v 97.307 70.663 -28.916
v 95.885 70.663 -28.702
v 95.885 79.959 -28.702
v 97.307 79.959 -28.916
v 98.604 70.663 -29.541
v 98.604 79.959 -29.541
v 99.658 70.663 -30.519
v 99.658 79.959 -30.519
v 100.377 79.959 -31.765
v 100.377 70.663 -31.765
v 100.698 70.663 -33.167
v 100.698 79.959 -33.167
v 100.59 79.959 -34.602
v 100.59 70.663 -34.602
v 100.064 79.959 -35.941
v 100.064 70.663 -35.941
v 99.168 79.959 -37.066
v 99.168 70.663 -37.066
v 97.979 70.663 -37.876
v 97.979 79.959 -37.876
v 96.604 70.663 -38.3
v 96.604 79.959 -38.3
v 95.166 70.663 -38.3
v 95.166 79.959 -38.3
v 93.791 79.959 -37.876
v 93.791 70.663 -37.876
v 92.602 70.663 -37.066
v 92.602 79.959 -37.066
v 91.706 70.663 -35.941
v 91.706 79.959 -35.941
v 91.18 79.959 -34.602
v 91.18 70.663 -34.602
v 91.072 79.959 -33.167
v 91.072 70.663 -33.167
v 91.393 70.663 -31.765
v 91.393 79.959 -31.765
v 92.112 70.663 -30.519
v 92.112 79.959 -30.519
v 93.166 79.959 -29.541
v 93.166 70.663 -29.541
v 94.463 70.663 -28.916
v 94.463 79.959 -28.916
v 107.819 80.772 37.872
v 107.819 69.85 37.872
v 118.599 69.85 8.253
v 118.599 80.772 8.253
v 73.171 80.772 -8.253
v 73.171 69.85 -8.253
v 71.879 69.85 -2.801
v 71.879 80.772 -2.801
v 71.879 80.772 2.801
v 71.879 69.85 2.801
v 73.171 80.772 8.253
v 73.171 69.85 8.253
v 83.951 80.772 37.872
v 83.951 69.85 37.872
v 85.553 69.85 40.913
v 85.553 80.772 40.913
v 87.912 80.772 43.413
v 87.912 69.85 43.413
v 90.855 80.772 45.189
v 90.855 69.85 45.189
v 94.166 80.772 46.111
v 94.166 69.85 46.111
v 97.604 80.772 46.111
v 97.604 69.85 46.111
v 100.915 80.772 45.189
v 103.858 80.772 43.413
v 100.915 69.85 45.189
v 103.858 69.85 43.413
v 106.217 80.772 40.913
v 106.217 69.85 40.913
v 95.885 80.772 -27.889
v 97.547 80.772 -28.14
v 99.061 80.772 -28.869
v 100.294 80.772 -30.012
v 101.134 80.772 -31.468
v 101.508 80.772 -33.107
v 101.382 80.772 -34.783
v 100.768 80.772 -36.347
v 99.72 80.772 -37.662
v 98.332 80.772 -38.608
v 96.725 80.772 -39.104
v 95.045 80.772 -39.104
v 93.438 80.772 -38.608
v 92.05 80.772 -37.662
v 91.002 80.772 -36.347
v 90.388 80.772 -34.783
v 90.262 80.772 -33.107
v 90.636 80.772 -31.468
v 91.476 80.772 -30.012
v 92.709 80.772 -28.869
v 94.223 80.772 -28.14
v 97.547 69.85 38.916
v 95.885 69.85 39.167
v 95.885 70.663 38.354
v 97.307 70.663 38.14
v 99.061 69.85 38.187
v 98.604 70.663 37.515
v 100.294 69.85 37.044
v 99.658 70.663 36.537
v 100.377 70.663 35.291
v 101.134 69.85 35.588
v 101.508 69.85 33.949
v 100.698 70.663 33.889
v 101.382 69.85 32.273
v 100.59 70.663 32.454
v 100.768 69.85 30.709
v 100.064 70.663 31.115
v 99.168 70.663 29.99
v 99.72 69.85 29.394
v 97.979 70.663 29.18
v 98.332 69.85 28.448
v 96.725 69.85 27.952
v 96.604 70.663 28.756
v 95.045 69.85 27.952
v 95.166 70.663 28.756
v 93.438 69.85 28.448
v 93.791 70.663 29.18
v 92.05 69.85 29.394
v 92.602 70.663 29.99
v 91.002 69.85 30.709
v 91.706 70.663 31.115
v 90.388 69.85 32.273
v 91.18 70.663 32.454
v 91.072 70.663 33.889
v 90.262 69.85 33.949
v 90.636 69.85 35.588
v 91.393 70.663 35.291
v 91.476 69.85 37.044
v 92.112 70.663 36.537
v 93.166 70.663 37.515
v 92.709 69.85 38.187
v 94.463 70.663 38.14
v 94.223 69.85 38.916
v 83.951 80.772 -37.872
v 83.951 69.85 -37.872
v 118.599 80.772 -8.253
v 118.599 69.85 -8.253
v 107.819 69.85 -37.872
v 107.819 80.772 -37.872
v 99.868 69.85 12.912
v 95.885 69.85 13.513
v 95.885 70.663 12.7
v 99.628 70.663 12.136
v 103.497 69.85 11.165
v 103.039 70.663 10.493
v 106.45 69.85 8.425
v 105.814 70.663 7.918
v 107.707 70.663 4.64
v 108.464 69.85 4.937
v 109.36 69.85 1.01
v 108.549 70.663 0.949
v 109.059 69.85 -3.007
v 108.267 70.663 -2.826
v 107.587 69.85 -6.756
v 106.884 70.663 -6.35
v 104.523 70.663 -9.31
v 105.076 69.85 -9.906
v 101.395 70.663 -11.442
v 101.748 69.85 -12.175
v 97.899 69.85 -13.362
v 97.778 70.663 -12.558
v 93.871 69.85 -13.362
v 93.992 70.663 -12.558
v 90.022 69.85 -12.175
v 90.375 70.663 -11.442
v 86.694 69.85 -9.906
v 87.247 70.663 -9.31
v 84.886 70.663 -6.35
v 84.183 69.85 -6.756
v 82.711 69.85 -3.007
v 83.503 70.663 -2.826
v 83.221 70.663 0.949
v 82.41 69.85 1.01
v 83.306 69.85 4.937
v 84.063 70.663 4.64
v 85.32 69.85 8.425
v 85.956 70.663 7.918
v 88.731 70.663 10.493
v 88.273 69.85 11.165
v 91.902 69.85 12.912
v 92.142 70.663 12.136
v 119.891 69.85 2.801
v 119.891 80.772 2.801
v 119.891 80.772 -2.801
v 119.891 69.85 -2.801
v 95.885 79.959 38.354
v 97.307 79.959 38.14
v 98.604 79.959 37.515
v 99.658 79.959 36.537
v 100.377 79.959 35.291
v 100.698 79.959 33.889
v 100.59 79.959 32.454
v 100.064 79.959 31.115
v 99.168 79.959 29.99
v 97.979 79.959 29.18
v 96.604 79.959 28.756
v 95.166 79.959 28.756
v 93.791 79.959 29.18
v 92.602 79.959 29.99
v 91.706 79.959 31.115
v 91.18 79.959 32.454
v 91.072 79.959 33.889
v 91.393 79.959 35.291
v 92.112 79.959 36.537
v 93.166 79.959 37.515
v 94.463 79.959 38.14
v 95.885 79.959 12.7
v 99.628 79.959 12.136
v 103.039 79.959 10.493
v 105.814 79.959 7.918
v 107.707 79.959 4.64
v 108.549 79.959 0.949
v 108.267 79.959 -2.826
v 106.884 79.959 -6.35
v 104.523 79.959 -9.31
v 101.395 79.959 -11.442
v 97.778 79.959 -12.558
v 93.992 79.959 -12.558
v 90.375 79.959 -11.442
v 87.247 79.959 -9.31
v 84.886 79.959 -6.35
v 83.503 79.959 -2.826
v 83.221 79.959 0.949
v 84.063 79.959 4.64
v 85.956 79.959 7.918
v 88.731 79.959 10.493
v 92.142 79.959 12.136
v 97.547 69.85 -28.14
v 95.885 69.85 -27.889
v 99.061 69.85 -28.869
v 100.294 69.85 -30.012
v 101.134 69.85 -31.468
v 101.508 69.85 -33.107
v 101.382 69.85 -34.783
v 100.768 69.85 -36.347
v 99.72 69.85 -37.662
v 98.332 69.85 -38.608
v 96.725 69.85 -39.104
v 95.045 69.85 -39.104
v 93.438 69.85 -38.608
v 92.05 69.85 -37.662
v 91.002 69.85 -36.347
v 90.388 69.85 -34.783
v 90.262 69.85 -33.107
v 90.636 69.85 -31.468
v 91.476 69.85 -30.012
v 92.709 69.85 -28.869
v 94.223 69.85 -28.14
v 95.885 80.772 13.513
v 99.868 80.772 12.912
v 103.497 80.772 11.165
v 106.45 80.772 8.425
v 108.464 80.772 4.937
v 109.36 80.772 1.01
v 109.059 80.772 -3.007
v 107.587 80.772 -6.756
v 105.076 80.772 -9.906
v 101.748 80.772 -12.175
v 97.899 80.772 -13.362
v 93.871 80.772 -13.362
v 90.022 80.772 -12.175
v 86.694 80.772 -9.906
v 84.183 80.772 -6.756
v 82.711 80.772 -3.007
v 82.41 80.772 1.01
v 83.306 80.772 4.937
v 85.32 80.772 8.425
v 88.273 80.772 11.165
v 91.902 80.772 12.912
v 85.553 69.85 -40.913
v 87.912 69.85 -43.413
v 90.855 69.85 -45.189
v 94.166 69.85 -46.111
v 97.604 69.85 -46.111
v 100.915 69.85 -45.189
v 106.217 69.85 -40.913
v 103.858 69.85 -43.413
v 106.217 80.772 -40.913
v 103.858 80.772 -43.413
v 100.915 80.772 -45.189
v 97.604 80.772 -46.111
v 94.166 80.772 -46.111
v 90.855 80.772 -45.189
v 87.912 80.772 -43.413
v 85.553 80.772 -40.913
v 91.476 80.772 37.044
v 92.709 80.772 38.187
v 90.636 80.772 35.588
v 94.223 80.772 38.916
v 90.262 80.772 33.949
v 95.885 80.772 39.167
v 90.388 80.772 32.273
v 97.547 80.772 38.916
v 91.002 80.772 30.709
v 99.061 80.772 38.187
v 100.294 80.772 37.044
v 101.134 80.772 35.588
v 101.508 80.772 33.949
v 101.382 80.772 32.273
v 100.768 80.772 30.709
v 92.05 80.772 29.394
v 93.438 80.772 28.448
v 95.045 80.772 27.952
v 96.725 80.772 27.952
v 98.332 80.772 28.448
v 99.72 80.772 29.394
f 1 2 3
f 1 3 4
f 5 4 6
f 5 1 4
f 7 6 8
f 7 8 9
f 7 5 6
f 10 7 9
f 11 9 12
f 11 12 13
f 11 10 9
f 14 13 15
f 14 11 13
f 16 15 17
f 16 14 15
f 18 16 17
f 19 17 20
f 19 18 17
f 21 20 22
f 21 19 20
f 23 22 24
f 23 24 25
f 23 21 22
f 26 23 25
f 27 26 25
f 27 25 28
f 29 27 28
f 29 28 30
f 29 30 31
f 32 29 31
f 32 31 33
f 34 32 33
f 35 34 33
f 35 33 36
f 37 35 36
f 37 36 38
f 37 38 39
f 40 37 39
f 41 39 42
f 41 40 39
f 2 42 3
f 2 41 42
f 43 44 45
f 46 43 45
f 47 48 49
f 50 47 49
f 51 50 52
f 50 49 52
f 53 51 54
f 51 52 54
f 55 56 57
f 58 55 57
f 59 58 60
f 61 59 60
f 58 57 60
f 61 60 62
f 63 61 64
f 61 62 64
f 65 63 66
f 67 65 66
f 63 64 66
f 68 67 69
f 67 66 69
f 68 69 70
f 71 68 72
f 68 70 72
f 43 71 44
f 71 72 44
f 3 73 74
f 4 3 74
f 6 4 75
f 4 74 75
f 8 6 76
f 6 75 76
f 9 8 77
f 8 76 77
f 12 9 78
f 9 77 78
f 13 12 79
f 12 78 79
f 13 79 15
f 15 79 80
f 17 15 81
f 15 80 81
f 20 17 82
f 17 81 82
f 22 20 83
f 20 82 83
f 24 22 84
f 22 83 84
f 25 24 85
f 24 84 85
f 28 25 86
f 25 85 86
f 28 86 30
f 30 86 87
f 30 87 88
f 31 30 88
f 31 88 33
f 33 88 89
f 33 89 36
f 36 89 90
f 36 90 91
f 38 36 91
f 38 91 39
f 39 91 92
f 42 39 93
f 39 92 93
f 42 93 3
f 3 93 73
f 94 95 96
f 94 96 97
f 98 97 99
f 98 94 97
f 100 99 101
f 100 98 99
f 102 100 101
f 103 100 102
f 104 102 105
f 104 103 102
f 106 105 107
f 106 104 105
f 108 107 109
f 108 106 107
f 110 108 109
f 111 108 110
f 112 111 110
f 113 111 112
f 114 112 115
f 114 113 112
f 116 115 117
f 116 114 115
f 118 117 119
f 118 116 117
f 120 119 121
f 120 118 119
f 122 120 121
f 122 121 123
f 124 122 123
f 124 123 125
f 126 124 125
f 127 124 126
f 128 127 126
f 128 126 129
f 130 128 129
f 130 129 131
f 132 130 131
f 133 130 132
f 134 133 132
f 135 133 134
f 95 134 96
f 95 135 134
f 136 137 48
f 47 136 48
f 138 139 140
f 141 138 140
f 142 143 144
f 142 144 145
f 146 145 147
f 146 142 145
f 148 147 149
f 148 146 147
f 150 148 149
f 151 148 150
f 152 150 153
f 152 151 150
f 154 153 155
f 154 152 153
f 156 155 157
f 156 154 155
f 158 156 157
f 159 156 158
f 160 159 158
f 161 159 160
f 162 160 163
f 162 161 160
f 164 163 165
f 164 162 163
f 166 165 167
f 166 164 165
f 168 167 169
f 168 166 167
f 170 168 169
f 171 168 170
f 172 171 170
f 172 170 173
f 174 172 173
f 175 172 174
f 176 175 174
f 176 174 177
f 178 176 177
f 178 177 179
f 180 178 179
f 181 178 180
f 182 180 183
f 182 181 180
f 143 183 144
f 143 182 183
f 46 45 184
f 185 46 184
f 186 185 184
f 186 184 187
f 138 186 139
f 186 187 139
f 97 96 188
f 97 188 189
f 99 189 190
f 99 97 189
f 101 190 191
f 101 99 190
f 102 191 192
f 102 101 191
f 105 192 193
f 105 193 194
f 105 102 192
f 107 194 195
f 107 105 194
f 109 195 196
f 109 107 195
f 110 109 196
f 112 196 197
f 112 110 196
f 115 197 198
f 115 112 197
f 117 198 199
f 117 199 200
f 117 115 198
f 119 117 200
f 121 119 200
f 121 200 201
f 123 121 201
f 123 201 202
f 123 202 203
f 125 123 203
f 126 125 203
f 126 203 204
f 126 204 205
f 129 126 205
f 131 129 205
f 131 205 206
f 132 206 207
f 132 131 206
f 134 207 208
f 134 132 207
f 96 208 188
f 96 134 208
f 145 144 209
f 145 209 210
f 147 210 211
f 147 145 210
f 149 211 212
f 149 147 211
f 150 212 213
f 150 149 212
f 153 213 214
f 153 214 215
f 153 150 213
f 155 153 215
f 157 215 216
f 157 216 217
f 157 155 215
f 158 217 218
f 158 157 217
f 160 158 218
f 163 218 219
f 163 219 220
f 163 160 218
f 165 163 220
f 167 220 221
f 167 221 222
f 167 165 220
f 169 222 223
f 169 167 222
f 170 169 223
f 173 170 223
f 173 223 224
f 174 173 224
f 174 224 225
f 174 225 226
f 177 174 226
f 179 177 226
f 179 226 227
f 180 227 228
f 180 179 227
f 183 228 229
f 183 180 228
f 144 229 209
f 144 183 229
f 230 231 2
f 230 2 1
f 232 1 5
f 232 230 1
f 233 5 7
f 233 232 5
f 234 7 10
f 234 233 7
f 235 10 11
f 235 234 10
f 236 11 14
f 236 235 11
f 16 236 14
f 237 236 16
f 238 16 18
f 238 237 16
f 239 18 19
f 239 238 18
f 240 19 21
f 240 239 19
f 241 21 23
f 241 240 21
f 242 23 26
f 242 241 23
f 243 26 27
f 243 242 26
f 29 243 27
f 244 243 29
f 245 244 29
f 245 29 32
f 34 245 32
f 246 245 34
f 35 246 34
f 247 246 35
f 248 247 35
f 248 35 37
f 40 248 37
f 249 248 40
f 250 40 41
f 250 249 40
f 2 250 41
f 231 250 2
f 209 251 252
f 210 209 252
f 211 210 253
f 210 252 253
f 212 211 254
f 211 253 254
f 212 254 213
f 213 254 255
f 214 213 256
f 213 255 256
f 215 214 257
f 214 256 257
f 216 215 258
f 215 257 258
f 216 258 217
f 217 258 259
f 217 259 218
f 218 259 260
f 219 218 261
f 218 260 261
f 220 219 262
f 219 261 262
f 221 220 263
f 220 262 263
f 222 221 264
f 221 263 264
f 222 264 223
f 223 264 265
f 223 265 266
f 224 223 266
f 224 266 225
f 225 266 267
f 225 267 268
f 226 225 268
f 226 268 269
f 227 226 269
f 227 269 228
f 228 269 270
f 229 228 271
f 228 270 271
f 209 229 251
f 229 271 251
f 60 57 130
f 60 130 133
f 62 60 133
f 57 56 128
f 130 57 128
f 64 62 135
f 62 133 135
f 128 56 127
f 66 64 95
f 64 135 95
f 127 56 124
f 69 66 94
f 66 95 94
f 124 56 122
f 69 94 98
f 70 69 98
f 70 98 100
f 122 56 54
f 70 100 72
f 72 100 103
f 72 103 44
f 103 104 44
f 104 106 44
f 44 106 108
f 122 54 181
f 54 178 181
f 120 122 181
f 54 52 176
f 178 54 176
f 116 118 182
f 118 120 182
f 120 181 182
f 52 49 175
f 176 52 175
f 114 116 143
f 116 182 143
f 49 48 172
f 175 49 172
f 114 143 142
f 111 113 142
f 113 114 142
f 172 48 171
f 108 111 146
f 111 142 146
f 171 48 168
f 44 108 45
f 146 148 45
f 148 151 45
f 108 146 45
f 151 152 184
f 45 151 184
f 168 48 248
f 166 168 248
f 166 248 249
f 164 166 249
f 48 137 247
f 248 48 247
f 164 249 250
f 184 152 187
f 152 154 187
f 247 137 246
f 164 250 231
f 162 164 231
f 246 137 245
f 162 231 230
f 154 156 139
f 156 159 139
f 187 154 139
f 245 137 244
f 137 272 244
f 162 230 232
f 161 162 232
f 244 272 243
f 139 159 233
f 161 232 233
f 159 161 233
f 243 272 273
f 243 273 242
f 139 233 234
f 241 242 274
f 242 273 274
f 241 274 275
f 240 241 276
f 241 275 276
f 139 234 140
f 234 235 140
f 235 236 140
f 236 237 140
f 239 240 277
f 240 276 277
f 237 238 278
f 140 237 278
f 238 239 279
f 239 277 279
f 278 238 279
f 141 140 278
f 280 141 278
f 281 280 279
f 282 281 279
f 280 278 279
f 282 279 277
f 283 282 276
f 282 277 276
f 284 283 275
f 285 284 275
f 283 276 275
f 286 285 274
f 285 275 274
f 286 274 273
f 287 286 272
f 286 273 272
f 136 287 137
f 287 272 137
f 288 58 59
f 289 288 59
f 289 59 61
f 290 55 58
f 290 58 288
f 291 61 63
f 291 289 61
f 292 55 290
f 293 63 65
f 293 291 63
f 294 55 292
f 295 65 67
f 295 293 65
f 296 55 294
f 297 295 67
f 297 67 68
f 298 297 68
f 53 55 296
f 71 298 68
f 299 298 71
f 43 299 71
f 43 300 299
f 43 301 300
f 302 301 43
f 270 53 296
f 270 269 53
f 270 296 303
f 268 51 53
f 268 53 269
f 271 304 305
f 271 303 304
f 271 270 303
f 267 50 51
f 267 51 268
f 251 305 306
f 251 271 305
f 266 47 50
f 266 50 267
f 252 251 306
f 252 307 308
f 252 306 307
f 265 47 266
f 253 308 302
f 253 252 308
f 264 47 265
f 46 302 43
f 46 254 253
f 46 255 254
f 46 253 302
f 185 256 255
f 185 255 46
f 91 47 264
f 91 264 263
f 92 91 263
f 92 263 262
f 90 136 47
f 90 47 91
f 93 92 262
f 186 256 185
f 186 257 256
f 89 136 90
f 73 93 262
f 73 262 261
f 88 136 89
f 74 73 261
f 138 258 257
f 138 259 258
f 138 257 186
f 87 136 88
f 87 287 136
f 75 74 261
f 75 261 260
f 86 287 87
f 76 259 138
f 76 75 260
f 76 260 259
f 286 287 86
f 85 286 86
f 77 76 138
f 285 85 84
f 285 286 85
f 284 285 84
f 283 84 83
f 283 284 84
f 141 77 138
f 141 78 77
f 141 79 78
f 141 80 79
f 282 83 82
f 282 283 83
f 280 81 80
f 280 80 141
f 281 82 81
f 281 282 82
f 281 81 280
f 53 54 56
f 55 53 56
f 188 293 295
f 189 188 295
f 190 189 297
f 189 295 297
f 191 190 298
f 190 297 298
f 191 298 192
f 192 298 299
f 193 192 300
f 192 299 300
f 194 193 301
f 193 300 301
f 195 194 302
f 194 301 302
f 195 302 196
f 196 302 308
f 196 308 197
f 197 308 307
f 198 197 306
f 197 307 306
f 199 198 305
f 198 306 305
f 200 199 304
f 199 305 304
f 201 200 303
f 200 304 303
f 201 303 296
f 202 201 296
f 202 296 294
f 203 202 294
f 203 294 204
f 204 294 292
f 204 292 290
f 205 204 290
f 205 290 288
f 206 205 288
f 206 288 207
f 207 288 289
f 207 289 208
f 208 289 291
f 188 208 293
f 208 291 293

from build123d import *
from build123d.topology import SkipClean

# Parameters (mm, degrees)
BOSS_EXTRUDE1_START     = 16.51
SKETCH2_R               = 6.6675
SKETCH2_R_2             = 47.625
SKETCH2_R_3             = 25.4
BOSS_EXTRUDE1_DEPTH     = 16.51
CUT_EXTRUDE1_REACH      = 129.898
SKETCH3_R               = 9.525
CHAMFER1_SIZE           = 0.8128
CHAMFER2_SIZE           = 0.8128
CHAMFER3_SIZE           = 3.175
FILLET2_R               = 1.524
SKETCH4_R               = 7.4803
SKETCH4_R_2             = 25.4
BOSS_EXTRUDE2_DEPTH     = 16.51
SKETCH6_R               = 76.2
SKETCH6_R_2             = 9.525
SKETCH6_R_3             = 25.4
BOSS_EXTRUDE3_DEPTH     = 16.51
SKETCH8_R               = 12.7
SKETCH8_R_2             = 4.826
BOSS_EXTRUDE4_DEPTH     = 9.8552
BOSS_EXTRUDE5_REACH     = 241.142
SKETCH9_R               = 19.05
CUT_EXTRUDE2_REACH      = 241.142
CUT_EXTRUDE2_END_RADIUS = 25.4
SKETCH8_4_R             = 12.7
CHAMFER4_SIZE           = 0.8128
CHAMFER5_SIZE           = 3.175
FILLET3_R               = 2.032
SKETCH10_R              = 4.826
SKETCH10_R_2            = 12.7
BOSS_EXTRUDE6_DEPTH     = 10.922
CHAMFER6_SIZE           = 0.8128


with BuildPart() as part:
    # Sketch1 → Revolve1 (revolve)
    with BuildSketch(Plane.XY, mode=Mode.PRIVATE) as revolve1_sk:
        Polygon((0, 25.4), (53.975, 25.4), (53.975, 47.625), (52.3748, 46.0248), (52.3748, 34.29), (34.925, 34.29), (16.51, 38.204229083), (16.51, 76.2), (1.6002, 76.2), (1.6002, 47.6377), (0, 46.0375), align=None)
    revolve(revolve1_sk.sketch.rotate(Axis((0, 0, 0), (1, 0, 0)), 90), axis=Axis((0, 0, 0), (1, 0, 0)))

    # Sketch2 → Boss-Extrude1 (add)
    # profile 1 of 2: a face of its own
    with BuildSketch(Plane(origin=(53.975, 0, 0), x_dir=(0, 0, -1), z_dir=(1, 0, 0)).offset(BOSS_EXTRUDE1_START)):
        with BuildLine():
            Line((-59.9948, 40.005), (-59.9948, 24.717162721))
            ThreePointArc((-59.9948, 24.717162721), (-60.246417717, 21.150810443), (-60.996285714, 17.655116229))
            ThreePointArc((-60.996285714, 17.655116229), (-63.5, 0), (-60.996285714, -17.655116229))
            ThreePointArc((-60.996285714, -17.655116229), (-60.246417717, -21.150810443), (-59.9948, -24.717162721))
            Line((-59.9948, -24.717162721), (-59.9948, -40.005))
            ThreePointArc((-59.9948, -40.005), (-54.139923135, -54.139923135), (-40.005, -59.9948))
            Line((-40.005, -59.9948), (-24.717162721, -59.9948))
            ThreePointArc((-24.717162721, -59.9948), (-21.150810443, -60.246417717), (-17.655116229, -60.996285714))
            ThreePointArc((-17.655116229, -60.996285714), (0, -63.5), (17.655116229, -60.996285714))
            ThreePointArc((17.655116229, -60.996285714), (21.150810443, -60.246417717), (24.717162721, -59.9948))
            Line((24.717162721, -59.9948), (40.005, -59.9948))
            ThreePointArc((40.005, -59.9948), (54.139923135, -54.139923135), (59.9948, -40.005))
            Line((59.9948, -40.005), (59.9948, -24.717162721))
            ThreePointArc((59.9948, -24.717162721), (60.246417717, -21.150810443), (60.996285714, -17.655116229))
            ThreePointArc((60.996285714, -17.655116229), (63.5, 0), (60.996285714, 17.655116229))
            ThreePointArc((60.996285714, 17.655116229), (60.246417717, 21.150810443), (59.9948, 24.717162721))
            Line((59.9948, 24.717162721), (59.9948, 40.005))
            ThreePointArc((59.9948, 40.005), (54.139923135, 54.139923135), (40.005, 59.9948))
            Line((40.005, 59.9948), (24.717162721, 59.9948))
            ThreePointArc((24.717162721, 59.9948), (21.150810443, 60.246417717), (17.655116229, 60.996285714))
            ThreePointArc((17.655116229, 60.996285714), (0, 63.5), (-17.655116229, 60.996285714))
            ThreePointArc((-17.655116229, 60.996285714), (-21.150810443, 60.246417717), (-24.717162721, 59.9948))
            Line((-24.717162721, 59.9948), (-40.005, 59.9948))
            ThreePointArc((-40.005, 59.9948), (-54.139923135, 54.139923135), (-59.9948, 40.005))
        make_face()
        with Locations((-42.656216575, -42.656216575)):
            Circle(SKETCH2_R, mode=Mode.SUBTRACT)
        with Locations((42.656216575, -42.656216575)):
            Circle(SKETCH2_R, mode=Mode.SUBTRACT)
        with Locations((42.656216575, 42.656216575)):
            Circle(SKETCH2_R, mode=Mode.SUBTRACT)
        with Locations((-42.656216575, 42.656216575)):
            Circle(SKETCH2_R, mode=Mode.SUBTRACT)
        Circle(SKETCH2_R_2, mode=Mode.SUBTRACT)
    # profile 2 of 2: a face of its own
    with BuildSketch(Plane(origin=(53.975, 0, 0), x_dir=(0, 0, -1), z_dir=(1, 0, 0)).offset(BOSS_EXTRUDE1_START)):
        Circle(SKETCH2_R_2)
        with Locations(Location((0, 0, 0), (0, 0, 180))):
            Circle(SKETCH2_R_3, mode=Mode.SUBTRACT)
    extrude(amount=-BOSS_EXTRUDE1_DEPTH)

    # Sketch3 → Cut-Extrude1 (cut, up to next)
    with BuildSketch(Plane.ZY.offset(-1.6002), mode=Mode.PRIVATE) as cut_extrude1_sk1:
        with Locations((-42.656216575, 42.656216575)):
            Circle(SKETCH3_R)
    cut_extrude1_tool1 = extrude(cut_extrude1_sk1.sketch, amount=-CUT_EXTRUDE1_REACH, mode=Mode.PRIVATE) & part.part
    # Sketch3 → Cut-Extrude1 (cut, up to next)
    with BuildSketch(Plane.ZY.offset(-1.6002), mode=Mode.PRIVATE) as cut_extrude1_sk2:
        with Locations((42.656216575, 42.656216575)):
            Circle(SKETCH3_R)
    cut_extrude1_tool2 = extrude(cut_extrude1_sk2.sketch, amount=-CUT_EXTRUDE1_REACH, mode=Mode.PRIVATE) & part.part
    # Sketch3 → Cut-Extrude1 (cut, up to next)
    with BuildSketch(Plane.ZY.offset(-1.6002), mode=Mode.PRIVATE) as cut_extrude1_sk3:
        with Locations((42.656216575, -42.656216575)):
            Circle(SKETCH3_R)
    cut_extrude1_tool3 = extrude(cut_extrude1_sk3.sketch, amount=-CUT_EXTRUDE1_REACH, mode=Mode.PRIVATE) & part.part
    # Sketch3 → Cut-Extrude1 (cut, up to next)
    with BuildSketch(Plane.ZY.offset(-1.6002), mode=Mode.PRIVATE) as cut_extrude1_sk4:
        with Locations((-42.656216575, -42.656216575)):
            Circle(SKETCH3_R)
    cut_extrude1_tool4 = extrude(cut_extrude1_sk4.sketch, amount=-CUT_EXTRUDE1_REACH, mode=Mode.PRIVATE) & part.part
    add(cut_extrude1_tool1.solids().sort_by_distance((1.6002, 42.656217, -42.656217))[0], mode=Mode.SUBTRACT)
    add(cut_extrude1_tool2.solids().sort_by_distance((1.6002, 42.656217, 42.656217))[0], mode=Mode.SUBTRACT)
    add(cut_extrude1_tool3.solids().sort_by_distance((1.6002, -42.656217, 42.656217))[0], mode=Mode.SUBTRACT)
    add(cut_extrude1_tool4.solids().sort_by_distance((1.6002, -42.656217, -42.656217))[0], mode=Mode.SUBTRACT)

    # Chamfer1
    chamfer1_edges = [part.edges().sort_by_distance(p)[0] for p in [
        (70.485, 42.656216575, 49.323716575),
        (70.485, 42.656216575, -35.988716575),
        (70.485, -42.656216575, -35.988716575),
        (70.485, -42.656216575, 49.323716575),
        (53.975, -42.656216575, 49.323716575),
        (53.975, -42.656216575, -35.988716575),
        (53.975, 42.656216575, -35.988716575),
        (53.975, 42.656216575, 49.323716575),
    ]]
    chamfer(chamfer1_edges, length=CHAMFER1_SIZE)

    # Chamfer2
    chamfer2_edges = [part.edges().sort_by_distance(p)[0] for p in [
        (1.6002, -42.656216575, 33.131216575),
        (16.51, -42.656216575, 33.131216575),
        (1.6002, 42.656216575, 33.131216575),
        (16.51, 42.656216575, 33.131216575),
        (1.6002, 42.656216575, -52.181216575),
        (16.51, 42.656216575, -52.181216575),
        (1.6002, -42.656216575, -52.181216575),
        (16.51, -42.656216575, -52.181216575),
    ]]
    chamfer(chamfer2_edges, length=CHAMFER2_SIZE)

    # Chamfer3
    chamfer3_edges = [part.edges().sort_by_distance(p)[0] for p in [
        (0, 0, -25.4),
        (70.485, 0, -25.4),
    ]]
    chamfer(chamfer3_edges, length=CHAMFER3_SIZE)

    # Fillet2
    fillet2_edges = [part.edges().sort_by_distance(p)[0] for p in [
        (16.51, 0, -38.204229083),
        (52.3748, 0, -34.29),
    ]]
    fillet(fillet2_edges, radius=FILLET2_R)


with BuildPart() as body_2:
    # Sketch4 → Boss-Extrude2 (new body)
    with BuildSketch(Plane(origin=(70.485, 0, 0), x_dir=(0, 0, -1), z_dir=(1, 0, 0))):
        with BuildLine():
            Line((-59.9948, 40.005), (-59.9948, 24.717162721))
            ThreePointArc((-59.9948, 24.717162721), (-60.246417717, 21.150810443), (-60.996285714, 17.655116229))
            ThreePointArc((-60.996285714, 17.655116229), (-63.5, 0), (-60.996285714, -17.655116229))
            ThreePointArc((-60.996285714, -17.655116229), (-60.246417717, -21.150810443), (-59.9948, -24.717162721))
            Line((-59.9948, -24.717162721), (-59.9948, -40.005))
            ThreePointArc((-59.9948, -40.005), (-54.139923135, -54.139923135), (-40.005, -59.9948))
            Line((-40.005, -59.9948), (-24.717162721, -59.9948))
            ThreePointArc((-24.717162721, -59.9948), (-21.150810443, -60.246417717), (-17.655116229, -60.996285714))
            ThreePointArc((-17.655116229, -60.996285714), (0, -63.5), (17.655116229, -60.996285714))
            ThreePointArc((17.655116229, -60.996285714), (21.150810443, -60.246417717), (24.717162721, -59.9948))
            Line((24.717162721, -59.9948), (40.005, -59.9948))
            ThreePointArc((40.005, -59.9948), (54.139923135, -54.139923135), (59.9948, -40.005))
            Line((59.9948, -40.005), (59.9948, -24.717162721))
            ThreePointArc((59.9948, -24.717162721), (60.246417717, -21.150810443), (60.996285714, -17.655116229))
            ThreePointArc((60.996285714, -17.655116229), (63.5, 0), (60.996285714, 17.655116229))
            ThreePointArc((60.996285714, 17.655116229), (60.246417717, 21.150810443), (59.9948, 24.717162721))
            Line((59.9948, 24.717162721), (59.9948, 40.005))
            ThreePointArc((59.9948, 40.005), (54.139923135, 54.139923135), (40.005, 59.9948))
            Line((40.005, 59.9948), (24.717162721, 59.9948))
            ThreePointArc((24.717162721, 59.9948), (21.150810443, 60.246417717), (17.655116229, 60.996285714))
            ThreePointArc((17.655116229, 60.996285714), (0, 63.5), (-17.655116229, 60.996285714))
            ThreePointArc((-17.655116229, 60.996285714), (-21.150810443, 60.246417717), (-24.717162721, 59.9948))
            Line((-24.717162721, 59.9948), (-40.005, 59.9948))
            ThreePointArc((-40.005, 59.9948), (-54.139923135, 54.139923135), (-59.9948, 40.005))
        make_face()
        with Locations((42.656216575, -42.656216575)):
            Circle(SKETCH4_R, mode=Mode.SUBTRACT)
        with Locations((42.656216575, 42.656216575)):
            Circle(SKETCH4_R, mode=Mode.SUBTRACT)
        with Locations((-42.656216575, 42.656216575)):
            Circle(SKETCH4_R, mode=Mode.SUBTRACT)
        with Locations((-42.656216575, -42.656216575)):
            Circle(SKETCH4_R, mode=Mode.SUBTRACT)
        Circle(SKETCH4_R_2, mode=Mode.SUBTRACT)
    extrude(amount=BOSS_EXTRUDE2_DEPTH)

    # Sketch5 → Revolve2 (revolve)
    with BuildSketch(Plane.XY, mode=Mode.PRIVATE) as revolve2_sk:
        with BuildLine():
            Line((86.995, -25.4), (156.845, -25.4))
            Line((156.845, -25.4), (156.845, -38.1))
            Line((156.845, -38.1), (141.097, -38.1))
            Line((141.097, -38.1), (100.143007491, -49.07358922))
            ThreePointArc((100.143007491, -49.07358922), (93.625730565, -50.369956202), (86.995, -50.804557244))
            Line((86.995, -50.804557244), (86.995, -25.4))
        make_face()
    revolve(revolve2_sk.sketch.rotate(Axis((0, 0, 0), (1, 0, 0)), 270), axis=Axis((0, 0, 0), (1, 0, 0)))

    # Sketch6 → Boss-Extrude3 (add)
    with BuildSketch(Plane(origin=(156.845, 0, 0), x_dir=(0, 0, -1), z_dir=(1, 0, 0))):
        Circle(SKETCH6_R)
        with Locations((-42.656216575, 42.656216575)):
            Circle(SKETCH6_R_2, mode=Mode.SUBTRACT)
        with Locations((-42.656216575, -42.656216575)):
            Circle(SKETCH6_R_2, mode=Mode.SUBTRACT)
        with Locations((42.656216575, 42.656216575)):
            Circle(SKETCH6_R_2, mode=Mode.SUBTRACT)
        with Locations((42.656216575, -42.656216575)):
            Circle(SKETCH6_R_2, mode=Mode.SUBTRACT)
        Circle(SKETCH6_R_3, mode=Mode.SUBTRACT)
    extrude(amount=BOSS_EXTRUDE3_DEPTH)

    # Sketch8 → Boss-Extrude4 (add)
    # profile 1 of 4: a face of its own
    with BuildSketch(Plane(origin=(0, 69.85, 0), x_dir=(1, 0, 0), z_dir=(0, 1, 0))):
        with Locations((95.885, 33.528)):
            Circle(SKETCH8_R)
        with Locations(Location((95.885, 33.528, 0), (0, 0, 270))):
            Circle(SKETCH8_R_2, mode=Mode.SUBTRACT)
    # profile 2 of 4: a face of its own
    with BuildSketch(Plane(origin=(0, 69.85, 0), x_dir=(1, 0, 0), z_dir=(0, 1, 0))):
        with BuildLine():
            ThreePointArc((108.585, 33.528), (93.679668144, 21.020941537), (83.950903716, 37.87165582))
            Line((83.950903716, 37.87165582), (73.170574985, 8.252946058))
            ThreePointArc((73.170574985, 8.252946058), (71.715357925, 0), (73.170574985, -8.252946058))
            Line((73.170574985, -8.252946058), (83.950903716, -37.87165582))
            ThreePointArc((83.950903716, -37.87165582), (93.679668144, -21.020941537), (108.585, -33.528))
            ThreePointArc((108.585, -33.528), (108.392058463, -35.733331856), (107.819096284, -37.87165582))
            Line((107.819096284, -37.87165582), (118.599425015, -8.252946058))
            ThreePointArc((118.599425015, -8.252946058), (120.054642075, 0), (118.599425015, 8.252946058))
            Line((118.599425015, 8.252946058), (107.819096284, 37.87165582))
            ThreePointArc((107.819096284, 37.87165582), (108.392058463, 35.733331856), (108.585, 33.528))
        make_face()
        with Locations((95.885, 0)):
            Circle(SKETCH8_R, mode=Mode.SUBTRACT)
    # profile 3 of 4: a face of its own
    with BuildSketch(Plane(origin=(0, 69.85, 0), x_dir=(1, 0, 0), z_dir=(0, 1, 0))):
        with Locations((95.885, -33.528)):
            Circle(SKETCH8_R)
        with Locations(Location((95.885, -33.528, 0), (0, 0, 270))):
            Circle(SKETCH8_R_2, mode=Mode.SUBTRACT)
    # profile 4 of 4: a face of its own
    with BuildSketch(Plane(origin=(0, 69.85, 0), x_dir=(1, 0, 0), z_dir=(0, 1, 0))):
        with Locations((95.885, 0)):
            Circle(SKETCH8_R)
    extrude(amount=-BOSS_EXTRUDE4_DEPTH)

    # Sketch9 → Boss-Extrude5 (add, up to next)
    with BuildSketch(Plane(origin=(0, 69.85, 0), x_dir=(1, 0, 0), z_dir=(0, 1, 0)), mode=Mode.PRIVATE) as boss_extrude5_sk1:
        with Locations((95.924642075, 0)):
            Circle(SKETCH9_R)
    boss_extrude5_tool1 = extrude(boss_extrude5_sk1.sketch, amount=-BOSS_EXTRUDE5_REACH, mode=Mode.PRIVATE) - body_2.part
    add(boss_extrude5_tool1.solids().sort_by_distance((95.924642, 69.85, 0))[0])

    # Cut-Extrude2: up to this cylinder (the profile starts outside it)
    with SkipClean():  # the faces are left unmerged after this step: merging them gives an invalid solid
        cut_extrude2_end = Plane(origin=(95.885, 0, 0), z_dir=(-1, 0, 0)) * Cylinder(CUT_EXTRUDE2_END_RADIUS, 534.084, mode=Mode.PRIVATE)
        # Sketch8<4> → Cut-Extrude2 (cut, up to the surface)
        with BuildSketch(Plane(origin=(0, 69.85, 0), x_dir=(1, 0, 0), z_dir=(0, 1, 0)), mode=Mode.PRIVATE) as cut_extrude2_sk1:
            with Locations(Location((95.885, 0, 0), (0, 0, 270))):
                Circle(SKETCH8_4_R)
        cut_extrude2_tool1 = extrude(cut_extrude2_sk1.sketch, amount=-CUT_EXTRUDE2_REACH, mode=Mode.PRIVATE) - cut_extrude2_end
        add(cut_extrude2_tool1.solids().sort_by_distance((95.885, 69.85, 0))[0], mode=Mode.SUBTRACT)

    # Chamfer4
    chamfer4_edges = [body_2.edges().sort_by_distance(p)[0] for p in [
        (86.995, 42.656216575, -35.175916575),
        (173.355, 0, 76.2),
        (156.845, 42.656216575, -33.131216575),
        (156.845, -42.656216575, -33.131216575),
        (156.845, -42.656216575, 52.181216575),
        (156.845, 42.656216575, 52.181216575),
        (156.845, 0, 76.2),
        (173.355, 42.656216575, -33.131216575),
        (173.355, -42.656216575, -33.131216575),
        (173.355, -42.656216575, 52.181216575),
        (173.355, 42.656216575, 52.181216575),
        (86.995, -42.656216575, 50.136516575),
        (95.885, 69.85, -38.354),
        (95.885, 59.9948, 28.702),
        (86.995, 42.656216575, 50.136516575),
        (95.885, 69.85, 28.702),
        (86.995, -42.656216575, -35.175916575),
        (95.885, 69.85, -12.7),
        (70.485, -42.656216575, -35.175916575),
        (70.485, 42.656216575, 50.136516575),
        (70.485, -42.656216575, 50.136516575),
        (70.485, 42.656216575, -35.175916575),
    ]]
    chamfer(chamfer4_edges, length=CHAMFER4_SIZE)

    # Chamfer5
    chamfer5_edges = [body_2.edges().sort_by_distance(p)[0] for p in [
        (173.355, 0, 25.4),
        (70.485, 0, 25.4),
    ]]
    chamfer(chamfer5_edges, length=CHAMFER5_SIZE)

    # Fillet3
    fillet3_edges = [body_2.edges().sort_by_distance(p)[0] for p in [
        (141.097, 0, -38.1),
        (156.845, 0, -38.1),
        (86.995, -41.448857468, -29.378482796),
        (93.420094709, 46.72459453, 18.884643029),
        (114.974642075, 45.09946471, 0),
        (93.420094709, 46.72459453, -18.884643029),
    ]]
    fillet(fillet3_edges, radius=FILLET3_R)


with BuildPart() as body_2_2:
    # Sketch10 → Boss-Extrude6 (new body)
    with BuildSketch(Plane(origin=(0, 69.85, 0), x_dir=(1, 0, 0), z_dir=(0, 1, 0))):
        with BuildLine():
            Line((83.950903716, 37.87165582), (73.170574985, 8.252946058))
            ThreePointArc((73.170574985, 8.252946058), (71.715357925, 0), (73.170574985, -8.252946058))
            Line((73.170574985, -8.252946058), (83.950903716, -37.87165582))
            ThreePointArc((83.950903716, -37.87165582), (95.885, -46.228), (107.819096284, -37.87165582))
            Line((107.819096284, -37.87165582), (118.599425015, -8.252946058))
            ThreePointArc((118.599425015, -8.252946058), (120.054642075, 0), (118.599425015, 8.252946058))
            Line((118.599425015, 8.252946058), (107.819096284, 37.87165582))
            ThreePointArc((107.819096284, 37.87165582), (95.885, 46.228), (83.950903716, 37.87165582))
        make_face()
        with Locations(Location((95.885, 33.528, 0), (0, 0, 270))):
            Circle(SKETCH10_R, mode=Mode.SUBTRACT)
        with Locations(Location((95.885, -33.528, 0), (0, 0, 270))):
            Circle(SKETCH10_R, mode=Mode.SUBTRACT)
        with Locations(Location((95.885, 0, 0), (0, 0, 270))):
            Circle(SKETCH10_R_2, mode=Mode.SUBTRACT)
    extrude(amount=BOSS_EXTRUDE6_DEPTH)

    # Chamfer6
    chamfer6_edges = [body_2_2.edges().sort_by_distance(p)[0] for p in [
        (95.885, 69.85, -38.354),
        (95.885, 80.772, -38.354),
        (95.885, 69.85, 28.702),
        (95.885, 80.772, 28.702),
        (95.885, 69.85, -12.7),
        (95.885, 80.772, -12.7),
    ]]
    chamfer(chamfer6_edges, length=CHAMFER6_SIZE)


solid = body_2_2.part
